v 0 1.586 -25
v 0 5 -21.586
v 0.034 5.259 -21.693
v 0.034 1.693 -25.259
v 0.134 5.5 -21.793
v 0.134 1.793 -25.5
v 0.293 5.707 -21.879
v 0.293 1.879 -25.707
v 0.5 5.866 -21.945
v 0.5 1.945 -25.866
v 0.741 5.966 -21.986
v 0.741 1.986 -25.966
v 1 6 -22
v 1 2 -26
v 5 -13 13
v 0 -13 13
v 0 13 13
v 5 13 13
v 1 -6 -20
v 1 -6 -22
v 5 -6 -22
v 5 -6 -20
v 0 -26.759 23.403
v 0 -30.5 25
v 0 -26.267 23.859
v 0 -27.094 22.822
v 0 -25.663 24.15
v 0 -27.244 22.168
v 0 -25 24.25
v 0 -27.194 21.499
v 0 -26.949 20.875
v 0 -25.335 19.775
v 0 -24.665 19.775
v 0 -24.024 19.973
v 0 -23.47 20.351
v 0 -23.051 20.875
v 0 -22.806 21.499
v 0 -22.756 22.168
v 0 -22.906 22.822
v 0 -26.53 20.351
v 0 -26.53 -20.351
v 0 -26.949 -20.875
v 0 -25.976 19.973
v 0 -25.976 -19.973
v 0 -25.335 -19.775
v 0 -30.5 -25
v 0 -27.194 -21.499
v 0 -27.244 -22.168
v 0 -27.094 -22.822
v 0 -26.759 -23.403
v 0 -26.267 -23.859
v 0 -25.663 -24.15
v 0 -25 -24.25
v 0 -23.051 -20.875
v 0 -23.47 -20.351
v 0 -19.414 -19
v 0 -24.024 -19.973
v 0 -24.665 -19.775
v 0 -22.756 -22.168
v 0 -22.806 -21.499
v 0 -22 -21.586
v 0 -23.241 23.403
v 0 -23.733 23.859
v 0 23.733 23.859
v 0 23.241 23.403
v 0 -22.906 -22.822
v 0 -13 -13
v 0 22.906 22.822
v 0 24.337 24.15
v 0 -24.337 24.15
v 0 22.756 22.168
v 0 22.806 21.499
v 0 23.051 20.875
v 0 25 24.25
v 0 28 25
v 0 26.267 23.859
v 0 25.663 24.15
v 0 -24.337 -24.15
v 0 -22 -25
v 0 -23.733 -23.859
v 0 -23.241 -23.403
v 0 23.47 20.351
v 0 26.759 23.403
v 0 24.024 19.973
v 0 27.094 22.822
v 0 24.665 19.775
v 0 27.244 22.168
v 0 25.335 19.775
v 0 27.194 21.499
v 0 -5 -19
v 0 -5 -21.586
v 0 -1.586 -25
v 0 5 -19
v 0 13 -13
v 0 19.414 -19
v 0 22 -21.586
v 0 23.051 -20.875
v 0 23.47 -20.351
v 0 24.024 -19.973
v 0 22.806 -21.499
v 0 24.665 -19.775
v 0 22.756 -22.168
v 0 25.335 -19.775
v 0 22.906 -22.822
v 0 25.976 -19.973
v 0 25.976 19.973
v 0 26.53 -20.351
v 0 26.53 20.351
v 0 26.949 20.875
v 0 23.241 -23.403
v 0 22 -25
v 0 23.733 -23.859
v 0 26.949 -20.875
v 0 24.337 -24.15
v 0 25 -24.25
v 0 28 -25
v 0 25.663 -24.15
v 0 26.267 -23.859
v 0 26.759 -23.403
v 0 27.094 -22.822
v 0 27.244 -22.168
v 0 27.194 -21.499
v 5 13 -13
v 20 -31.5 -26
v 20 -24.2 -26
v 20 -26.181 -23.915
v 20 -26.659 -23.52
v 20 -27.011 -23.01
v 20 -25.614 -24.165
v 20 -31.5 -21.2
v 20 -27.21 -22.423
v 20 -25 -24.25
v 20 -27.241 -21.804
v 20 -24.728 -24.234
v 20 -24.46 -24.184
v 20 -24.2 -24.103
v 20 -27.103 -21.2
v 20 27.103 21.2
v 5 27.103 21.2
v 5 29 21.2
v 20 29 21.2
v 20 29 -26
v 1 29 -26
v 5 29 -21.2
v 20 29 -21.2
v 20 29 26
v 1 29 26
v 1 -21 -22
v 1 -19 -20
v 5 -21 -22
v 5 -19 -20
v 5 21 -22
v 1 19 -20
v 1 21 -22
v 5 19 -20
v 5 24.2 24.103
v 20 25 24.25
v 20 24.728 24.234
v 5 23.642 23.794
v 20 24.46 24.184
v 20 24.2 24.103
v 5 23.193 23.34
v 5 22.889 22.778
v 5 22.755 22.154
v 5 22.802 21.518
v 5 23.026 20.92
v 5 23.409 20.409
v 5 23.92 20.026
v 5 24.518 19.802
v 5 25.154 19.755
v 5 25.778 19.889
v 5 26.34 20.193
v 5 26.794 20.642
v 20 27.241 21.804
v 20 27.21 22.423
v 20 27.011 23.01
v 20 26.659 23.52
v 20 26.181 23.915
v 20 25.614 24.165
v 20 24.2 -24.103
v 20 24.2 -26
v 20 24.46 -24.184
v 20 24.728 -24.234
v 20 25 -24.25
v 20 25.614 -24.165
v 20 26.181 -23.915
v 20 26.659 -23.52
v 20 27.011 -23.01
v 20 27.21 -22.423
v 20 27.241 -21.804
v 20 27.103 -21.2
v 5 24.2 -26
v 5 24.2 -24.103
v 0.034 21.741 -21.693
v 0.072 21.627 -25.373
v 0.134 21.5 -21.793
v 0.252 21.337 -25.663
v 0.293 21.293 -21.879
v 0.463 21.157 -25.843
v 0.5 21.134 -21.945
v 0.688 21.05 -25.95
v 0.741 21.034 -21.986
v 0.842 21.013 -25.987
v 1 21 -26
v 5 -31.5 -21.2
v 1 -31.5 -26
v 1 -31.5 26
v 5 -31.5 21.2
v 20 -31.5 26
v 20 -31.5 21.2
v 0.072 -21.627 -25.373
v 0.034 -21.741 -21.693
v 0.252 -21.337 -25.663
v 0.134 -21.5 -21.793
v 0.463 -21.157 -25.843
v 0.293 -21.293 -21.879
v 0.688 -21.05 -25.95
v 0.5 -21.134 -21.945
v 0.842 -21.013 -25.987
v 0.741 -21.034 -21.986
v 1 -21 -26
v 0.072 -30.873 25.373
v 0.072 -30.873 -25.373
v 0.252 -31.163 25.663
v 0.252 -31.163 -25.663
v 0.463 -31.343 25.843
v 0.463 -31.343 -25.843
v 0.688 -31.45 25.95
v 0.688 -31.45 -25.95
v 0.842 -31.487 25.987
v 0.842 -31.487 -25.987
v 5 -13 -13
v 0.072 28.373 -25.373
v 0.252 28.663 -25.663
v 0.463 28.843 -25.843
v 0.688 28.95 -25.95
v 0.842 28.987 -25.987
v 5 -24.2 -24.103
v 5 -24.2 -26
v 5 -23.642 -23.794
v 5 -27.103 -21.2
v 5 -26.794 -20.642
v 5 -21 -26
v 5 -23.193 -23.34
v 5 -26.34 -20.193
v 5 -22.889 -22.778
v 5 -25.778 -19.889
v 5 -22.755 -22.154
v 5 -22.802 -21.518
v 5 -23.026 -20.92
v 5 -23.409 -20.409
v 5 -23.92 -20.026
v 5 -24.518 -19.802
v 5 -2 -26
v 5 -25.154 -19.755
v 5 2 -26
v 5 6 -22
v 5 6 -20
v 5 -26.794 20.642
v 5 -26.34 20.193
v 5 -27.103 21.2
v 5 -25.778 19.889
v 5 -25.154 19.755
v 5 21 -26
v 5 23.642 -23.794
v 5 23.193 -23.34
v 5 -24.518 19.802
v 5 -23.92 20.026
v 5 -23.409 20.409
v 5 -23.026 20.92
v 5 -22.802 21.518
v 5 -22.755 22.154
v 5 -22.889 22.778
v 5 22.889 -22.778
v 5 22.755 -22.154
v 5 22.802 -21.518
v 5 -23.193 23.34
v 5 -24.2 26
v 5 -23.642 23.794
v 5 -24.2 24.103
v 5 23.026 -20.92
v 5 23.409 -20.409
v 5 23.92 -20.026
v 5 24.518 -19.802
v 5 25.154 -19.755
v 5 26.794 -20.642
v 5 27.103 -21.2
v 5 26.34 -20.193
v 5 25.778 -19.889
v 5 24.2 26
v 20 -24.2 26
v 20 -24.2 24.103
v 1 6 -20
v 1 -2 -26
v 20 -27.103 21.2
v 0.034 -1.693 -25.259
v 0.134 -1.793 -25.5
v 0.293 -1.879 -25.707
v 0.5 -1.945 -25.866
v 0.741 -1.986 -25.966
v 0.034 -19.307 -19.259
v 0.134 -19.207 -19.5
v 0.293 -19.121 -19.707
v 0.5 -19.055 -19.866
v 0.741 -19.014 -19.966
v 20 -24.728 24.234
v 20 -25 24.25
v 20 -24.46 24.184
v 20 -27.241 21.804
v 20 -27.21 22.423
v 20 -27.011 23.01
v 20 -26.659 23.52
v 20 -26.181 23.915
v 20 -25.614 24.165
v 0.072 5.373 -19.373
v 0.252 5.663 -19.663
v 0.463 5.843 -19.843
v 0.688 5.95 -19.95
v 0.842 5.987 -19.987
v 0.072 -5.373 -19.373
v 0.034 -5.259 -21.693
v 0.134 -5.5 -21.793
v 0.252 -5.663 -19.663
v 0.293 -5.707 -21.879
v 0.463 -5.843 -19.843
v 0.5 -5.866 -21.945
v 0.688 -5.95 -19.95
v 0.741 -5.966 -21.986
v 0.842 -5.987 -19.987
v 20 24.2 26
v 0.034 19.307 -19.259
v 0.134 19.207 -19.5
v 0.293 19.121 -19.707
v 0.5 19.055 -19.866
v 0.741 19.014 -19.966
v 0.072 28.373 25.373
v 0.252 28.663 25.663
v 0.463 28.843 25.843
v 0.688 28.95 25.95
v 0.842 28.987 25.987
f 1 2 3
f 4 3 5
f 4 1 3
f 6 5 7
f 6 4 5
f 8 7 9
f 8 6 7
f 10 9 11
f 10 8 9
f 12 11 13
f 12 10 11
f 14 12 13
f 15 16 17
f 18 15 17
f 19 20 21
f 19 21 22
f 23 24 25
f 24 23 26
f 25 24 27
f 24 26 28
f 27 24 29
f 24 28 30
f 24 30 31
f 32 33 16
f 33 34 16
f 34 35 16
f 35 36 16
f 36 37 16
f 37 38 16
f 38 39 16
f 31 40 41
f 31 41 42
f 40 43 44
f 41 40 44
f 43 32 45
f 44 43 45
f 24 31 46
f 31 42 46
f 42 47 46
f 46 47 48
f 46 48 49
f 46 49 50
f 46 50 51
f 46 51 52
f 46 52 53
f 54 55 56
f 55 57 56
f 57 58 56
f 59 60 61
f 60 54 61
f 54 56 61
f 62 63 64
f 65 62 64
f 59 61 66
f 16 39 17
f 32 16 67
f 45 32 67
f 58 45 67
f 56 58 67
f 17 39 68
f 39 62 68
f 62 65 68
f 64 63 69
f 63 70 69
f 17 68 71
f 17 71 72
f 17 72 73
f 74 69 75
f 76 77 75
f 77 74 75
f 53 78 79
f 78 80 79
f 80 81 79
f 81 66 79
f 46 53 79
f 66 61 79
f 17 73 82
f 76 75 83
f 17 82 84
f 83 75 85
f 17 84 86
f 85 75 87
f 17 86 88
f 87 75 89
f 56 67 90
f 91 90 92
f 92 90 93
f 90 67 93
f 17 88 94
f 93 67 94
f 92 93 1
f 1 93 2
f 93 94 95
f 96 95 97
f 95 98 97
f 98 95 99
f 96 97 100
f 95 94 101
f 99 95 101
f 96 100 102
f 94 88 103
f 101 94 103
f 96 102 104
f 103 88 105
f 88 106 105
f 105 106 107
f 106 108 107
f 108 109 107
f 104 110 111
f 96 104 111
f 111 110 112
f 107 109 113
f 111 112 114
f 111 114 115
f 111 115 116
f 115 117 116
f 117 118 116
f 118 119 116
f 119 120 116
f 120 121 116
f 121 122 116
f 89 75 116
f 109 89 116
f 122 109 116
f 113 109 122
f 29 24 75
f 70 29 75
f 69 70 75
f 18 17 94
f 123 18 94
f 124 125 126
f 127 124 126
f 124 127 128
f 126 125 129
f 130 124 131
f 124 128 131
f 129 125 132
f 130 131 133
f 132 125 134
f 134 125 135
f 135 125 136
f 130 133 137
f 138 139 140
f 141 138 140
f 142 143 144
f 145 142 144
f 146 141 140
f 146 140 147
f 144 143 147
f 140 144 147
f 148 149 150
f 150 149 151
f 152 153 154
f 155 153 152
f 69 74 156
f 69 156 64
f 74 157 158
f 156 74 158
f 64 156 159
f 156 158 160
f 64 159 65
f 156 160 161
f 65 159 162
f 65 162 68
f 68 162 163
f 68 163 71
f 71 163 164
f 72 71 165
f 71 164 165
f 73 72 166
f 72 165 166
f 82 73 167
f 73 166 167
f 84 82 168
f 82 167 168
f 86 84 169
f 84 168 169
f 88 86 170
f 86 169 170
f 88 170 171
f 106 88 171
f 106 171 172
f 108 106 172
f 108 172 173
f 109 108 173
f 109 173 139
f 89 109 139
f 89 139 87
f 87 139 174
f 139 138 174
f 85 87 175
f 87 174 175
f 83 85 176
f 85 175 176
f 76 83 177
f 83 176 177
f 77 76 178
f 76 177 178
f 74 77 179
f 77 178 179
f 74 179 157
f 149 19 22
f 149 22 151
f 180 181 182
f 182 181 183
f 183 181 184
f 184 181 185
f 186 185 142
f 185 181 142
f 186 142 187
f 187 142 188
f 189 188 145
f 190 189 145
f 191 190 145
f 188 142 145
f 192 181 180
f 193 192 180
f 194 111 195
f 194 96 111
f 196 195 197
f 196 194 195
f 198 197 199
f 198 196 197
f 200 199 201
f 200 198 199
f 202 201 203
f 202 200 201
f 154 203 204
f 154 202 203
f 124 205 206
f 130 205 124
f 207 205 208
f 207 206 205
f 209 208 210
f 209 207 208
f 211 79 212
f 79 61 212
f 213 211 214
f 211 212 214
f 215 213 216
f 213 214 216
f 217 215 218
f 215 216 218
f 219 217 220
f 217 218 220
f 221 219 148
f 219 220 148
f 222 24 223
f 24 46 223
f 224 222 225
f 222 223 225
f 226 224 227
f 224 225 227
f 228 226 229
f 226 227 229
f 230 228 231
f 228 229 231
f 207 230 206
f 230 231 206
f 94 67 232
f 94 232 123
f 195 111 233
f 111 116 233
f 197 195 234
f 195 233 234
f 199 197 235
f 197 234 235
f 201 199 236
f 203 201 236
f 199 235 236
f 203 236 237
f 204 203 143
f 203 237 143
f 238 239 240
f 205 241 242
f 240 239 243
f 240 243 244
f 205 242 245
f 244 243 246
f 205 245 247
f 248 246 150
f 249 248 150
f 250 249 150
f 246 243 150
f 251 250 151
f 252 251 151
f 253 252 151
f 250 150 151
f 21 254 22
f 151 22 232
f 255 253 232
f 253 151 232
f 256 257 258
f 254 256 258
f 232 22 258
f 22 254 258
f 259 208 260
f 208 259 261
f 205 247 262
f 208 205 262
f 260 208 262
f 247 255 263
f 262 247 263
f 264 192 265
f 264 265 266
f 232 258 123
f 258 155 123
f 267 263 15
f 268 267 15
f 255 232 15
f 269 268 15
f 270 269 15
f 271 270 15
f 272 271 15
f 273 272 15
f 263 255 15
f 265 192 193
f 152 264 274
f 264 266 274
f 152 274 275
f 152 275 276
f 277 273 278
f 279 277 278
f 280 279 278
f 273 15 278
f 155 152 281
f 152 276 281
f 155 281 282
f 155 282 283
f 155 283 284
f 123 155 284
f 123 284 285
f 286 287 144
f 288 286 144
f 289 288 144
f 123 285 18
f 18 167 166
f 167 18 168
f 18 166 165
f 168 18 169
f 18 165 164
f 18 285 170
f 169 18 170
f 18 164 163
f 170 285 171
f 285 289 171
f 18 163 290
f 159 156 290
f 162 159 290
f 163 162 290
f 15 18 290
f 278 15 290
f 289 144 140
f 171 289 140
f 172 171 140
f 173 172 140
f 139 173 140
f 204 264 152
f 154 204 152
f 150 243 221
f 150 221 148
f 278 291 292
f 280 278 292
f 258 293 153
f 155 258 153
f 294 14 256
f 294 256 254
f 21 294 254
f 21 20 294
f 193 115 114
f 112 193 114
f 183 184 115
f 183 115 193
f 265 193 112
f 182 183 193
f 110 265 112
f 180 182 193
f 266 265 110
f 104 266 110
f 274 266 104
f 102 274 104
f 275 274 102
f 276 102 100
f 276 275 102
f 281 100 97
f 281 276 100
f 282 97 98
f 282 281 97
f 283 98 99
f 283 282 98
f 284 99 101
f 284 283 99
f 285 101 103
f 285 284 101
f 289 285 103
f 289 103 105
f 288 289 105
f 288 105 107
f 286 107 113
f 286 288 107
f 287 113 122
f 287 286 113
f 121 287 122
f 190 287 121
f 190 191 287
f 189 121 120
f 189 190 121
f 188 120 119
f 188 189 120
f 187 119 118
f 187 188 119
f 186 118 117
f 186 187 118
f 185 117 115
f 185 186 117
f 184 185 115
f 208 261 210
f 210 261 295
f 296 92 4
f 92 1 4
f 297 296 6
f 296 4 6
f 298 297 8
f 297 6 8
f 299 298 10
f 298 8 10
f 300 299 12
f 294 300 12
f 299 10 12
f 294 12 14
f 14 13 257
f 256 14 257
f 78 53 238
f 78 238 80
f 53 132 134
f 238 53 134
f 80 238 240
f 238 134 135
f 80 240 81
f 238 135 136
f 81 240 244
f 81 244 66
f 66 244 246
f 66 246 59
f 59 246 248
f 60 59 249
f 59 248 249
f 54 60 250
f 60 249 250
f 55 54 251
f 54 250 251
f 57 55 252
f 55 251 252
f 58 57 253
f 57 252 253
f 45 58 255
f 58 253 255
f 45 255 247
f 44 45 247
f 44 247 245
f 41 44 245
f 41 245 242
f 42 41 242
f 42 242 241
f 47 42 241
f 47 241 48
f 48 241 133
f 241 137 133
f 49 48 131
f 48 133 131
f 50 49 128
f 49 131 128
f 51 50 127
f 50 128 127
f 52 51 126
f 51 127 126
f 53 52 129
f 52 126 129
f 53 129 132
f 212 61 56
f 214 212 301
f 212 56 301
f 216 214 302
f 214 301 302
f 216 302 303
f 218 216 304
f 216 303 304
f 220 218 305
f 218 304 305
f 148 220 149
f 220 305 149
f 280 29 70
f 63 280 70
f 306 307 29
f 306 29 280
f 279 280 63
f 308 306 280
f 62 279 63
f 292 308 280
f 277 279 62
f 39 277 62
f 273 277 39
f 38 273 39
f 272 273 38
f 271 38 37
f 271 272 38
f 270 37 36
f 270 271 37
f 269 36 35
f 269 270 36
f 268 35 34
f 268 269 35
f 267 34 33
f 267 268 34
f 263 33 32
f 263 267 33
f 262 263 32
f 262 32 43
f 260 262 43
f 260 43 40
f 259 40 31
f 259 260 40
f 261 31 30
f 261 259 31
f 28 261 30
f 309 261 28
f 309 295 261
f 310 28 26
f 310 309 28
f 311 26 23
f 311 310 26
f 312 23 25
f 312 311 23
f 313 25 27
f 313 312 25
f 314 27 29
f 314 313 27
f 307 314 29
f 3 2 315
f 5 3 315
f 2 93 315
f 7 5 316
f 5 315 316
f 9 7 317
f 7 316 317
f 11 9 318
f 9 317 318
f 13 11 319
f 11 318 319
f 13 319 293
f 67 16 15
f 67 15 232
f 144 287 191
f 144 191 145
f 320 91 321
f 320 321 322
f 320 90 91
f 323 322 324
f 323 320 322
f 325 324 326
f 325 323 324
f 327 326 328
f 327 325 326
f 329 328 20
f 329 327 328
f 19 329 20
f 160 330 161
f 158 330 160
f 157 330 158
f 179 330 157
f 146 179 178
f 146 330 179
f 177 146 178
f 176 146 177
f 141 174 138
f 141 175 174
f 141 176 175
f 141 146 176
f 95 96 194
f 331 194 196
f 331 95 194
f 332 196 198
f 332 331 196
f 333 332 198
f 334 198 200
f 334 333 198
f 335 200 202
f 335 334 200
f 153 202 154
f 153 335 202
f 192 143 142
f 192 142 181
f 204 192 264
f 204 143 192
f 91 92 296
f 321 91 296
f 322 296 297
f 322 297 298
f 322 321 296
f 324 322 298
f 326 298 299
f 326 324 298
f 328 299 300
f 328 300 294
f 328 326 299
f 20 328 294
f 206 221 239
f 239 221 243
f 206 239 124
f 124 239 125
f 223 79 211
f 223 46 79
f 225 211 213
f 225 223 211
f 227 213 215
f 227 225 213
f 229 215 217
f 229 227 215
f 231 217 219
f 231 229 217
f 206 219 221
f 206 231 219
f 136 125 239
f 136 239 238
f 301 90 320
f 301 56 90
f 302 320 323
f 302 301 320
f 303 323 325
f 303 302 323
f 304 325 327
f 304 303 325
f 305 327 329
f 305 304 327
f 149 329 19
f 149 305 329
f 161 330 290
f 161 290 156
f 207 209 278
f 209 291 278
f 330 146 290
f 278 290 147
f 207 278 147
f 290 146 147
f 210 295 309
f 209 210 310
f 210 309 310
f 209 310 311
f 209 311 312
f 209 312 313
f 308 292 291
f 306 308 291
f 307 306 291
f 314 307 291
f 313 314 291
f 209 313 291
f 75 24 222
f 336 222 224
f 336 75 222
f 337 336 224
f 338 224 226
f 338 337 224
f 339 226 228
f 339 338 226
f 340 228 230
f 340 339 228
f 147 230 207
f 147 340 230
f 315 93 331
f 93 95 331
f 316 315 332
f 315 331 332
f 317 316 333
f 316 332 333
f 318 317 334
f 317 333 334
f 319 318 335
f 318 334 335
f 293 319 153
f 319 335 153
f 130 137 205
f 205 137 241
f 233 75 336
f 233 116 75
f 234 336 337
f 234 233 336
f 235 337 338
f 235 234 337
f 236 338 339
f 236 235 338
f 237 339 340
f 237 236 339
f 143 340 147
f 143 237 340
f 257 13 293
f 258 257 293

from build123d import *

# Parameters (mm, degrees)
SKETCH2_W               = 52
SKETCH2_H               = 58
SKETCH2_W_2             = 26
SKETCH2_H_2             = 26
BOSS_EXTRUDE1_DEPTH     = 5
SKETCH3_W               = 4.8
SKETCH3_H               = 4.8
BOSS_EXTRUDE2_DEPTH     = 15
M4_CLEARANCE_HOLE1_D    = 4.5
MIRROR2_COPY_1_SKETCH_W = 4.8
MIRROR2_COPY_1_SKETCH_H = 4.8
MIRROR2_COPY_1_DEPTH    = 15
MIRROR2_COPY_2_D        = 4.5
SKETCH7_W               = 6
SKETCH7_H               = 15
CUT_EXTRUDE1_DEPTH      = 44.783558558
CHAMFER1_SIZE           = 2
BOSS_EXTRUDE4_DEPTH     = 2.5
CHAMFER2_SIZE           = 4
FILLET1_R               = 1


with BuildPart() as part:
    # Sketch2 → Boss-Extrude1 (new body)
    with BuildSketch(Plane(origin=(0, 0, 0), x_dir=(0, 0, -1), z_dir=(1, 0, 0))):
        Rectangle(SKETCH2_W, SKETCH2_H)
        Rectangle(SKETCH2_W_2, SKETCH2_H_2, mode=Mode.SUBTRACT)
    extrude(amount=BOSS_EXTRUDE1_DEPTH)

    # Sketch3 → Boss-Extrude2 (add)
    with BuildSketch(Plane(origin=(5, 0, 0), x_dir=(0, 0, -1), z_dir=(1, 0, 0))):
        with Locations((-23.6, 26.6)):
            Rectangle(SKETCH3_W, SKETCH3_H)
    boss_extrude2 = extrude(amount=BOSS_EXTRUDE2_DEPTH)

    # M4 Clearance Hole1 (through all)
    with Locations(Plane(origin=(0, 25, 22), x_dir=(0, 0, -1), z_dir=(-1, 0, 0))):
        with Locations((0, 0)):
            m4_clearance_hole1 = Hole(M4_CLEARANCE_HOLE1_D / 2)

    # Mirror1: Boss-Extrude2, M4 Clearance Hole1 across plane
    add(boss_extrude2.mirror(Plane.XY))
    add(m4_clearance_hole1.mirror(Plane.XY), mode=Mode.SUBTRACT)

    # Mirror2: Boss-Extrude2, M4 Clearance Hole1 across plane
    add(boss_extrude2.mirror(Plane.ZX))
    add(m4_clearance_hole1.mirror(Plane.ZX), mode=Mode.SUBTRACT)

    # Mirror2 copy 1 sketch → Mirror2 copy 1 (add)
    with BuildSketch(Plane(origin=(5, 0, 0), x_dir=(0, 0, 1), z_dir=(1, 0, 0))):
        with Locations((-23.6, 26.6)):
            Rectangle(MIRROR2_COPY_1_SKETCH_W, MIRROR2_COPY_1_SKETCH_H)
    extrude(amount=MIRROR2_COPY_1_DEPTH)

    # Mirror2 copy 2 (through all)
    with Locations(Plane(origin=(0, -25, -22), x_dir=(0, 0, 1), z_dir=(-1, 0, 0))):
        with Locations((0, 0)):
            Hole(MIRROR2_COPY_2_D / 2)

    # Sketch7 → Cut-Extrude1 (cut, through all)
    with BuildSketch(Plane.ZY):
        with Locations((-23, 13.5)):
            Rectangle(SKETCH7_W, SKETCH7_H)
    cut_extrude1 = extrude(amount=-CUT_EXTRUDE1_DEPTH, mode=Mode.SUBTRACT)

    # Mirror3: Cut-Extrude1 across plane
    add(cut_extrude1.mirror(Plane.ZX), mode=Mode.SUBTRACT)

    # Chamfer1
    chamfer1_edges = [part.edges().sort_by_distance(p)[0] for p in [
        (2.5, 21, -20),
        (2.5, -21, -20),
    ]]
    chamfer(chamfer1_edges, length=CHAMFER1_SIZE)

    # Sketch9 → Boss-Extrude4 (add)
    with BuildSketch(Plane.XZ.offset(29)):
        Polygon((0, 26), (0, -26), (20, -26), (20, -21.2), (5, -21.2), (5, 21.2), (20, 21.2), (20, 26), align=None)
    extrude(amount=BOSS_EXTRUDE4_DEPTH)

    # Chamfer2
    chamfer2_edges = [part.edges().sort_by_distance(p)[0] for p in [
        (2.5, 6, -26),
        (2.5, -6, -26),
    ]]
    chamfer(chamfer2_edges, length=CHAMFER2_SIZE)

    # Fillet1
    fillet1_edges = [part.edges().sort_by_distance(p)[0] for p in [
        (0, 25, -26),
        (0, 12.5, -20),
        (0, -12.5, -20),
        (0, -21, -24),
        (0, 21, -24),
        (0, -20, -21),
        (0, 20, -21),
        (0, -31.5, 0),
        (0, 0, -26),
        (0, 6, -21),
        (0, -6, -21),
        (0, -4, -24),
        (0, 4, -24),
        (0, 29, 0),
        (0, -26.25, -26),
        (0, -1.25, 26),
    ]]
    fillet(fillet1_edges, radius=FILLET1_R)


solid = part.part
